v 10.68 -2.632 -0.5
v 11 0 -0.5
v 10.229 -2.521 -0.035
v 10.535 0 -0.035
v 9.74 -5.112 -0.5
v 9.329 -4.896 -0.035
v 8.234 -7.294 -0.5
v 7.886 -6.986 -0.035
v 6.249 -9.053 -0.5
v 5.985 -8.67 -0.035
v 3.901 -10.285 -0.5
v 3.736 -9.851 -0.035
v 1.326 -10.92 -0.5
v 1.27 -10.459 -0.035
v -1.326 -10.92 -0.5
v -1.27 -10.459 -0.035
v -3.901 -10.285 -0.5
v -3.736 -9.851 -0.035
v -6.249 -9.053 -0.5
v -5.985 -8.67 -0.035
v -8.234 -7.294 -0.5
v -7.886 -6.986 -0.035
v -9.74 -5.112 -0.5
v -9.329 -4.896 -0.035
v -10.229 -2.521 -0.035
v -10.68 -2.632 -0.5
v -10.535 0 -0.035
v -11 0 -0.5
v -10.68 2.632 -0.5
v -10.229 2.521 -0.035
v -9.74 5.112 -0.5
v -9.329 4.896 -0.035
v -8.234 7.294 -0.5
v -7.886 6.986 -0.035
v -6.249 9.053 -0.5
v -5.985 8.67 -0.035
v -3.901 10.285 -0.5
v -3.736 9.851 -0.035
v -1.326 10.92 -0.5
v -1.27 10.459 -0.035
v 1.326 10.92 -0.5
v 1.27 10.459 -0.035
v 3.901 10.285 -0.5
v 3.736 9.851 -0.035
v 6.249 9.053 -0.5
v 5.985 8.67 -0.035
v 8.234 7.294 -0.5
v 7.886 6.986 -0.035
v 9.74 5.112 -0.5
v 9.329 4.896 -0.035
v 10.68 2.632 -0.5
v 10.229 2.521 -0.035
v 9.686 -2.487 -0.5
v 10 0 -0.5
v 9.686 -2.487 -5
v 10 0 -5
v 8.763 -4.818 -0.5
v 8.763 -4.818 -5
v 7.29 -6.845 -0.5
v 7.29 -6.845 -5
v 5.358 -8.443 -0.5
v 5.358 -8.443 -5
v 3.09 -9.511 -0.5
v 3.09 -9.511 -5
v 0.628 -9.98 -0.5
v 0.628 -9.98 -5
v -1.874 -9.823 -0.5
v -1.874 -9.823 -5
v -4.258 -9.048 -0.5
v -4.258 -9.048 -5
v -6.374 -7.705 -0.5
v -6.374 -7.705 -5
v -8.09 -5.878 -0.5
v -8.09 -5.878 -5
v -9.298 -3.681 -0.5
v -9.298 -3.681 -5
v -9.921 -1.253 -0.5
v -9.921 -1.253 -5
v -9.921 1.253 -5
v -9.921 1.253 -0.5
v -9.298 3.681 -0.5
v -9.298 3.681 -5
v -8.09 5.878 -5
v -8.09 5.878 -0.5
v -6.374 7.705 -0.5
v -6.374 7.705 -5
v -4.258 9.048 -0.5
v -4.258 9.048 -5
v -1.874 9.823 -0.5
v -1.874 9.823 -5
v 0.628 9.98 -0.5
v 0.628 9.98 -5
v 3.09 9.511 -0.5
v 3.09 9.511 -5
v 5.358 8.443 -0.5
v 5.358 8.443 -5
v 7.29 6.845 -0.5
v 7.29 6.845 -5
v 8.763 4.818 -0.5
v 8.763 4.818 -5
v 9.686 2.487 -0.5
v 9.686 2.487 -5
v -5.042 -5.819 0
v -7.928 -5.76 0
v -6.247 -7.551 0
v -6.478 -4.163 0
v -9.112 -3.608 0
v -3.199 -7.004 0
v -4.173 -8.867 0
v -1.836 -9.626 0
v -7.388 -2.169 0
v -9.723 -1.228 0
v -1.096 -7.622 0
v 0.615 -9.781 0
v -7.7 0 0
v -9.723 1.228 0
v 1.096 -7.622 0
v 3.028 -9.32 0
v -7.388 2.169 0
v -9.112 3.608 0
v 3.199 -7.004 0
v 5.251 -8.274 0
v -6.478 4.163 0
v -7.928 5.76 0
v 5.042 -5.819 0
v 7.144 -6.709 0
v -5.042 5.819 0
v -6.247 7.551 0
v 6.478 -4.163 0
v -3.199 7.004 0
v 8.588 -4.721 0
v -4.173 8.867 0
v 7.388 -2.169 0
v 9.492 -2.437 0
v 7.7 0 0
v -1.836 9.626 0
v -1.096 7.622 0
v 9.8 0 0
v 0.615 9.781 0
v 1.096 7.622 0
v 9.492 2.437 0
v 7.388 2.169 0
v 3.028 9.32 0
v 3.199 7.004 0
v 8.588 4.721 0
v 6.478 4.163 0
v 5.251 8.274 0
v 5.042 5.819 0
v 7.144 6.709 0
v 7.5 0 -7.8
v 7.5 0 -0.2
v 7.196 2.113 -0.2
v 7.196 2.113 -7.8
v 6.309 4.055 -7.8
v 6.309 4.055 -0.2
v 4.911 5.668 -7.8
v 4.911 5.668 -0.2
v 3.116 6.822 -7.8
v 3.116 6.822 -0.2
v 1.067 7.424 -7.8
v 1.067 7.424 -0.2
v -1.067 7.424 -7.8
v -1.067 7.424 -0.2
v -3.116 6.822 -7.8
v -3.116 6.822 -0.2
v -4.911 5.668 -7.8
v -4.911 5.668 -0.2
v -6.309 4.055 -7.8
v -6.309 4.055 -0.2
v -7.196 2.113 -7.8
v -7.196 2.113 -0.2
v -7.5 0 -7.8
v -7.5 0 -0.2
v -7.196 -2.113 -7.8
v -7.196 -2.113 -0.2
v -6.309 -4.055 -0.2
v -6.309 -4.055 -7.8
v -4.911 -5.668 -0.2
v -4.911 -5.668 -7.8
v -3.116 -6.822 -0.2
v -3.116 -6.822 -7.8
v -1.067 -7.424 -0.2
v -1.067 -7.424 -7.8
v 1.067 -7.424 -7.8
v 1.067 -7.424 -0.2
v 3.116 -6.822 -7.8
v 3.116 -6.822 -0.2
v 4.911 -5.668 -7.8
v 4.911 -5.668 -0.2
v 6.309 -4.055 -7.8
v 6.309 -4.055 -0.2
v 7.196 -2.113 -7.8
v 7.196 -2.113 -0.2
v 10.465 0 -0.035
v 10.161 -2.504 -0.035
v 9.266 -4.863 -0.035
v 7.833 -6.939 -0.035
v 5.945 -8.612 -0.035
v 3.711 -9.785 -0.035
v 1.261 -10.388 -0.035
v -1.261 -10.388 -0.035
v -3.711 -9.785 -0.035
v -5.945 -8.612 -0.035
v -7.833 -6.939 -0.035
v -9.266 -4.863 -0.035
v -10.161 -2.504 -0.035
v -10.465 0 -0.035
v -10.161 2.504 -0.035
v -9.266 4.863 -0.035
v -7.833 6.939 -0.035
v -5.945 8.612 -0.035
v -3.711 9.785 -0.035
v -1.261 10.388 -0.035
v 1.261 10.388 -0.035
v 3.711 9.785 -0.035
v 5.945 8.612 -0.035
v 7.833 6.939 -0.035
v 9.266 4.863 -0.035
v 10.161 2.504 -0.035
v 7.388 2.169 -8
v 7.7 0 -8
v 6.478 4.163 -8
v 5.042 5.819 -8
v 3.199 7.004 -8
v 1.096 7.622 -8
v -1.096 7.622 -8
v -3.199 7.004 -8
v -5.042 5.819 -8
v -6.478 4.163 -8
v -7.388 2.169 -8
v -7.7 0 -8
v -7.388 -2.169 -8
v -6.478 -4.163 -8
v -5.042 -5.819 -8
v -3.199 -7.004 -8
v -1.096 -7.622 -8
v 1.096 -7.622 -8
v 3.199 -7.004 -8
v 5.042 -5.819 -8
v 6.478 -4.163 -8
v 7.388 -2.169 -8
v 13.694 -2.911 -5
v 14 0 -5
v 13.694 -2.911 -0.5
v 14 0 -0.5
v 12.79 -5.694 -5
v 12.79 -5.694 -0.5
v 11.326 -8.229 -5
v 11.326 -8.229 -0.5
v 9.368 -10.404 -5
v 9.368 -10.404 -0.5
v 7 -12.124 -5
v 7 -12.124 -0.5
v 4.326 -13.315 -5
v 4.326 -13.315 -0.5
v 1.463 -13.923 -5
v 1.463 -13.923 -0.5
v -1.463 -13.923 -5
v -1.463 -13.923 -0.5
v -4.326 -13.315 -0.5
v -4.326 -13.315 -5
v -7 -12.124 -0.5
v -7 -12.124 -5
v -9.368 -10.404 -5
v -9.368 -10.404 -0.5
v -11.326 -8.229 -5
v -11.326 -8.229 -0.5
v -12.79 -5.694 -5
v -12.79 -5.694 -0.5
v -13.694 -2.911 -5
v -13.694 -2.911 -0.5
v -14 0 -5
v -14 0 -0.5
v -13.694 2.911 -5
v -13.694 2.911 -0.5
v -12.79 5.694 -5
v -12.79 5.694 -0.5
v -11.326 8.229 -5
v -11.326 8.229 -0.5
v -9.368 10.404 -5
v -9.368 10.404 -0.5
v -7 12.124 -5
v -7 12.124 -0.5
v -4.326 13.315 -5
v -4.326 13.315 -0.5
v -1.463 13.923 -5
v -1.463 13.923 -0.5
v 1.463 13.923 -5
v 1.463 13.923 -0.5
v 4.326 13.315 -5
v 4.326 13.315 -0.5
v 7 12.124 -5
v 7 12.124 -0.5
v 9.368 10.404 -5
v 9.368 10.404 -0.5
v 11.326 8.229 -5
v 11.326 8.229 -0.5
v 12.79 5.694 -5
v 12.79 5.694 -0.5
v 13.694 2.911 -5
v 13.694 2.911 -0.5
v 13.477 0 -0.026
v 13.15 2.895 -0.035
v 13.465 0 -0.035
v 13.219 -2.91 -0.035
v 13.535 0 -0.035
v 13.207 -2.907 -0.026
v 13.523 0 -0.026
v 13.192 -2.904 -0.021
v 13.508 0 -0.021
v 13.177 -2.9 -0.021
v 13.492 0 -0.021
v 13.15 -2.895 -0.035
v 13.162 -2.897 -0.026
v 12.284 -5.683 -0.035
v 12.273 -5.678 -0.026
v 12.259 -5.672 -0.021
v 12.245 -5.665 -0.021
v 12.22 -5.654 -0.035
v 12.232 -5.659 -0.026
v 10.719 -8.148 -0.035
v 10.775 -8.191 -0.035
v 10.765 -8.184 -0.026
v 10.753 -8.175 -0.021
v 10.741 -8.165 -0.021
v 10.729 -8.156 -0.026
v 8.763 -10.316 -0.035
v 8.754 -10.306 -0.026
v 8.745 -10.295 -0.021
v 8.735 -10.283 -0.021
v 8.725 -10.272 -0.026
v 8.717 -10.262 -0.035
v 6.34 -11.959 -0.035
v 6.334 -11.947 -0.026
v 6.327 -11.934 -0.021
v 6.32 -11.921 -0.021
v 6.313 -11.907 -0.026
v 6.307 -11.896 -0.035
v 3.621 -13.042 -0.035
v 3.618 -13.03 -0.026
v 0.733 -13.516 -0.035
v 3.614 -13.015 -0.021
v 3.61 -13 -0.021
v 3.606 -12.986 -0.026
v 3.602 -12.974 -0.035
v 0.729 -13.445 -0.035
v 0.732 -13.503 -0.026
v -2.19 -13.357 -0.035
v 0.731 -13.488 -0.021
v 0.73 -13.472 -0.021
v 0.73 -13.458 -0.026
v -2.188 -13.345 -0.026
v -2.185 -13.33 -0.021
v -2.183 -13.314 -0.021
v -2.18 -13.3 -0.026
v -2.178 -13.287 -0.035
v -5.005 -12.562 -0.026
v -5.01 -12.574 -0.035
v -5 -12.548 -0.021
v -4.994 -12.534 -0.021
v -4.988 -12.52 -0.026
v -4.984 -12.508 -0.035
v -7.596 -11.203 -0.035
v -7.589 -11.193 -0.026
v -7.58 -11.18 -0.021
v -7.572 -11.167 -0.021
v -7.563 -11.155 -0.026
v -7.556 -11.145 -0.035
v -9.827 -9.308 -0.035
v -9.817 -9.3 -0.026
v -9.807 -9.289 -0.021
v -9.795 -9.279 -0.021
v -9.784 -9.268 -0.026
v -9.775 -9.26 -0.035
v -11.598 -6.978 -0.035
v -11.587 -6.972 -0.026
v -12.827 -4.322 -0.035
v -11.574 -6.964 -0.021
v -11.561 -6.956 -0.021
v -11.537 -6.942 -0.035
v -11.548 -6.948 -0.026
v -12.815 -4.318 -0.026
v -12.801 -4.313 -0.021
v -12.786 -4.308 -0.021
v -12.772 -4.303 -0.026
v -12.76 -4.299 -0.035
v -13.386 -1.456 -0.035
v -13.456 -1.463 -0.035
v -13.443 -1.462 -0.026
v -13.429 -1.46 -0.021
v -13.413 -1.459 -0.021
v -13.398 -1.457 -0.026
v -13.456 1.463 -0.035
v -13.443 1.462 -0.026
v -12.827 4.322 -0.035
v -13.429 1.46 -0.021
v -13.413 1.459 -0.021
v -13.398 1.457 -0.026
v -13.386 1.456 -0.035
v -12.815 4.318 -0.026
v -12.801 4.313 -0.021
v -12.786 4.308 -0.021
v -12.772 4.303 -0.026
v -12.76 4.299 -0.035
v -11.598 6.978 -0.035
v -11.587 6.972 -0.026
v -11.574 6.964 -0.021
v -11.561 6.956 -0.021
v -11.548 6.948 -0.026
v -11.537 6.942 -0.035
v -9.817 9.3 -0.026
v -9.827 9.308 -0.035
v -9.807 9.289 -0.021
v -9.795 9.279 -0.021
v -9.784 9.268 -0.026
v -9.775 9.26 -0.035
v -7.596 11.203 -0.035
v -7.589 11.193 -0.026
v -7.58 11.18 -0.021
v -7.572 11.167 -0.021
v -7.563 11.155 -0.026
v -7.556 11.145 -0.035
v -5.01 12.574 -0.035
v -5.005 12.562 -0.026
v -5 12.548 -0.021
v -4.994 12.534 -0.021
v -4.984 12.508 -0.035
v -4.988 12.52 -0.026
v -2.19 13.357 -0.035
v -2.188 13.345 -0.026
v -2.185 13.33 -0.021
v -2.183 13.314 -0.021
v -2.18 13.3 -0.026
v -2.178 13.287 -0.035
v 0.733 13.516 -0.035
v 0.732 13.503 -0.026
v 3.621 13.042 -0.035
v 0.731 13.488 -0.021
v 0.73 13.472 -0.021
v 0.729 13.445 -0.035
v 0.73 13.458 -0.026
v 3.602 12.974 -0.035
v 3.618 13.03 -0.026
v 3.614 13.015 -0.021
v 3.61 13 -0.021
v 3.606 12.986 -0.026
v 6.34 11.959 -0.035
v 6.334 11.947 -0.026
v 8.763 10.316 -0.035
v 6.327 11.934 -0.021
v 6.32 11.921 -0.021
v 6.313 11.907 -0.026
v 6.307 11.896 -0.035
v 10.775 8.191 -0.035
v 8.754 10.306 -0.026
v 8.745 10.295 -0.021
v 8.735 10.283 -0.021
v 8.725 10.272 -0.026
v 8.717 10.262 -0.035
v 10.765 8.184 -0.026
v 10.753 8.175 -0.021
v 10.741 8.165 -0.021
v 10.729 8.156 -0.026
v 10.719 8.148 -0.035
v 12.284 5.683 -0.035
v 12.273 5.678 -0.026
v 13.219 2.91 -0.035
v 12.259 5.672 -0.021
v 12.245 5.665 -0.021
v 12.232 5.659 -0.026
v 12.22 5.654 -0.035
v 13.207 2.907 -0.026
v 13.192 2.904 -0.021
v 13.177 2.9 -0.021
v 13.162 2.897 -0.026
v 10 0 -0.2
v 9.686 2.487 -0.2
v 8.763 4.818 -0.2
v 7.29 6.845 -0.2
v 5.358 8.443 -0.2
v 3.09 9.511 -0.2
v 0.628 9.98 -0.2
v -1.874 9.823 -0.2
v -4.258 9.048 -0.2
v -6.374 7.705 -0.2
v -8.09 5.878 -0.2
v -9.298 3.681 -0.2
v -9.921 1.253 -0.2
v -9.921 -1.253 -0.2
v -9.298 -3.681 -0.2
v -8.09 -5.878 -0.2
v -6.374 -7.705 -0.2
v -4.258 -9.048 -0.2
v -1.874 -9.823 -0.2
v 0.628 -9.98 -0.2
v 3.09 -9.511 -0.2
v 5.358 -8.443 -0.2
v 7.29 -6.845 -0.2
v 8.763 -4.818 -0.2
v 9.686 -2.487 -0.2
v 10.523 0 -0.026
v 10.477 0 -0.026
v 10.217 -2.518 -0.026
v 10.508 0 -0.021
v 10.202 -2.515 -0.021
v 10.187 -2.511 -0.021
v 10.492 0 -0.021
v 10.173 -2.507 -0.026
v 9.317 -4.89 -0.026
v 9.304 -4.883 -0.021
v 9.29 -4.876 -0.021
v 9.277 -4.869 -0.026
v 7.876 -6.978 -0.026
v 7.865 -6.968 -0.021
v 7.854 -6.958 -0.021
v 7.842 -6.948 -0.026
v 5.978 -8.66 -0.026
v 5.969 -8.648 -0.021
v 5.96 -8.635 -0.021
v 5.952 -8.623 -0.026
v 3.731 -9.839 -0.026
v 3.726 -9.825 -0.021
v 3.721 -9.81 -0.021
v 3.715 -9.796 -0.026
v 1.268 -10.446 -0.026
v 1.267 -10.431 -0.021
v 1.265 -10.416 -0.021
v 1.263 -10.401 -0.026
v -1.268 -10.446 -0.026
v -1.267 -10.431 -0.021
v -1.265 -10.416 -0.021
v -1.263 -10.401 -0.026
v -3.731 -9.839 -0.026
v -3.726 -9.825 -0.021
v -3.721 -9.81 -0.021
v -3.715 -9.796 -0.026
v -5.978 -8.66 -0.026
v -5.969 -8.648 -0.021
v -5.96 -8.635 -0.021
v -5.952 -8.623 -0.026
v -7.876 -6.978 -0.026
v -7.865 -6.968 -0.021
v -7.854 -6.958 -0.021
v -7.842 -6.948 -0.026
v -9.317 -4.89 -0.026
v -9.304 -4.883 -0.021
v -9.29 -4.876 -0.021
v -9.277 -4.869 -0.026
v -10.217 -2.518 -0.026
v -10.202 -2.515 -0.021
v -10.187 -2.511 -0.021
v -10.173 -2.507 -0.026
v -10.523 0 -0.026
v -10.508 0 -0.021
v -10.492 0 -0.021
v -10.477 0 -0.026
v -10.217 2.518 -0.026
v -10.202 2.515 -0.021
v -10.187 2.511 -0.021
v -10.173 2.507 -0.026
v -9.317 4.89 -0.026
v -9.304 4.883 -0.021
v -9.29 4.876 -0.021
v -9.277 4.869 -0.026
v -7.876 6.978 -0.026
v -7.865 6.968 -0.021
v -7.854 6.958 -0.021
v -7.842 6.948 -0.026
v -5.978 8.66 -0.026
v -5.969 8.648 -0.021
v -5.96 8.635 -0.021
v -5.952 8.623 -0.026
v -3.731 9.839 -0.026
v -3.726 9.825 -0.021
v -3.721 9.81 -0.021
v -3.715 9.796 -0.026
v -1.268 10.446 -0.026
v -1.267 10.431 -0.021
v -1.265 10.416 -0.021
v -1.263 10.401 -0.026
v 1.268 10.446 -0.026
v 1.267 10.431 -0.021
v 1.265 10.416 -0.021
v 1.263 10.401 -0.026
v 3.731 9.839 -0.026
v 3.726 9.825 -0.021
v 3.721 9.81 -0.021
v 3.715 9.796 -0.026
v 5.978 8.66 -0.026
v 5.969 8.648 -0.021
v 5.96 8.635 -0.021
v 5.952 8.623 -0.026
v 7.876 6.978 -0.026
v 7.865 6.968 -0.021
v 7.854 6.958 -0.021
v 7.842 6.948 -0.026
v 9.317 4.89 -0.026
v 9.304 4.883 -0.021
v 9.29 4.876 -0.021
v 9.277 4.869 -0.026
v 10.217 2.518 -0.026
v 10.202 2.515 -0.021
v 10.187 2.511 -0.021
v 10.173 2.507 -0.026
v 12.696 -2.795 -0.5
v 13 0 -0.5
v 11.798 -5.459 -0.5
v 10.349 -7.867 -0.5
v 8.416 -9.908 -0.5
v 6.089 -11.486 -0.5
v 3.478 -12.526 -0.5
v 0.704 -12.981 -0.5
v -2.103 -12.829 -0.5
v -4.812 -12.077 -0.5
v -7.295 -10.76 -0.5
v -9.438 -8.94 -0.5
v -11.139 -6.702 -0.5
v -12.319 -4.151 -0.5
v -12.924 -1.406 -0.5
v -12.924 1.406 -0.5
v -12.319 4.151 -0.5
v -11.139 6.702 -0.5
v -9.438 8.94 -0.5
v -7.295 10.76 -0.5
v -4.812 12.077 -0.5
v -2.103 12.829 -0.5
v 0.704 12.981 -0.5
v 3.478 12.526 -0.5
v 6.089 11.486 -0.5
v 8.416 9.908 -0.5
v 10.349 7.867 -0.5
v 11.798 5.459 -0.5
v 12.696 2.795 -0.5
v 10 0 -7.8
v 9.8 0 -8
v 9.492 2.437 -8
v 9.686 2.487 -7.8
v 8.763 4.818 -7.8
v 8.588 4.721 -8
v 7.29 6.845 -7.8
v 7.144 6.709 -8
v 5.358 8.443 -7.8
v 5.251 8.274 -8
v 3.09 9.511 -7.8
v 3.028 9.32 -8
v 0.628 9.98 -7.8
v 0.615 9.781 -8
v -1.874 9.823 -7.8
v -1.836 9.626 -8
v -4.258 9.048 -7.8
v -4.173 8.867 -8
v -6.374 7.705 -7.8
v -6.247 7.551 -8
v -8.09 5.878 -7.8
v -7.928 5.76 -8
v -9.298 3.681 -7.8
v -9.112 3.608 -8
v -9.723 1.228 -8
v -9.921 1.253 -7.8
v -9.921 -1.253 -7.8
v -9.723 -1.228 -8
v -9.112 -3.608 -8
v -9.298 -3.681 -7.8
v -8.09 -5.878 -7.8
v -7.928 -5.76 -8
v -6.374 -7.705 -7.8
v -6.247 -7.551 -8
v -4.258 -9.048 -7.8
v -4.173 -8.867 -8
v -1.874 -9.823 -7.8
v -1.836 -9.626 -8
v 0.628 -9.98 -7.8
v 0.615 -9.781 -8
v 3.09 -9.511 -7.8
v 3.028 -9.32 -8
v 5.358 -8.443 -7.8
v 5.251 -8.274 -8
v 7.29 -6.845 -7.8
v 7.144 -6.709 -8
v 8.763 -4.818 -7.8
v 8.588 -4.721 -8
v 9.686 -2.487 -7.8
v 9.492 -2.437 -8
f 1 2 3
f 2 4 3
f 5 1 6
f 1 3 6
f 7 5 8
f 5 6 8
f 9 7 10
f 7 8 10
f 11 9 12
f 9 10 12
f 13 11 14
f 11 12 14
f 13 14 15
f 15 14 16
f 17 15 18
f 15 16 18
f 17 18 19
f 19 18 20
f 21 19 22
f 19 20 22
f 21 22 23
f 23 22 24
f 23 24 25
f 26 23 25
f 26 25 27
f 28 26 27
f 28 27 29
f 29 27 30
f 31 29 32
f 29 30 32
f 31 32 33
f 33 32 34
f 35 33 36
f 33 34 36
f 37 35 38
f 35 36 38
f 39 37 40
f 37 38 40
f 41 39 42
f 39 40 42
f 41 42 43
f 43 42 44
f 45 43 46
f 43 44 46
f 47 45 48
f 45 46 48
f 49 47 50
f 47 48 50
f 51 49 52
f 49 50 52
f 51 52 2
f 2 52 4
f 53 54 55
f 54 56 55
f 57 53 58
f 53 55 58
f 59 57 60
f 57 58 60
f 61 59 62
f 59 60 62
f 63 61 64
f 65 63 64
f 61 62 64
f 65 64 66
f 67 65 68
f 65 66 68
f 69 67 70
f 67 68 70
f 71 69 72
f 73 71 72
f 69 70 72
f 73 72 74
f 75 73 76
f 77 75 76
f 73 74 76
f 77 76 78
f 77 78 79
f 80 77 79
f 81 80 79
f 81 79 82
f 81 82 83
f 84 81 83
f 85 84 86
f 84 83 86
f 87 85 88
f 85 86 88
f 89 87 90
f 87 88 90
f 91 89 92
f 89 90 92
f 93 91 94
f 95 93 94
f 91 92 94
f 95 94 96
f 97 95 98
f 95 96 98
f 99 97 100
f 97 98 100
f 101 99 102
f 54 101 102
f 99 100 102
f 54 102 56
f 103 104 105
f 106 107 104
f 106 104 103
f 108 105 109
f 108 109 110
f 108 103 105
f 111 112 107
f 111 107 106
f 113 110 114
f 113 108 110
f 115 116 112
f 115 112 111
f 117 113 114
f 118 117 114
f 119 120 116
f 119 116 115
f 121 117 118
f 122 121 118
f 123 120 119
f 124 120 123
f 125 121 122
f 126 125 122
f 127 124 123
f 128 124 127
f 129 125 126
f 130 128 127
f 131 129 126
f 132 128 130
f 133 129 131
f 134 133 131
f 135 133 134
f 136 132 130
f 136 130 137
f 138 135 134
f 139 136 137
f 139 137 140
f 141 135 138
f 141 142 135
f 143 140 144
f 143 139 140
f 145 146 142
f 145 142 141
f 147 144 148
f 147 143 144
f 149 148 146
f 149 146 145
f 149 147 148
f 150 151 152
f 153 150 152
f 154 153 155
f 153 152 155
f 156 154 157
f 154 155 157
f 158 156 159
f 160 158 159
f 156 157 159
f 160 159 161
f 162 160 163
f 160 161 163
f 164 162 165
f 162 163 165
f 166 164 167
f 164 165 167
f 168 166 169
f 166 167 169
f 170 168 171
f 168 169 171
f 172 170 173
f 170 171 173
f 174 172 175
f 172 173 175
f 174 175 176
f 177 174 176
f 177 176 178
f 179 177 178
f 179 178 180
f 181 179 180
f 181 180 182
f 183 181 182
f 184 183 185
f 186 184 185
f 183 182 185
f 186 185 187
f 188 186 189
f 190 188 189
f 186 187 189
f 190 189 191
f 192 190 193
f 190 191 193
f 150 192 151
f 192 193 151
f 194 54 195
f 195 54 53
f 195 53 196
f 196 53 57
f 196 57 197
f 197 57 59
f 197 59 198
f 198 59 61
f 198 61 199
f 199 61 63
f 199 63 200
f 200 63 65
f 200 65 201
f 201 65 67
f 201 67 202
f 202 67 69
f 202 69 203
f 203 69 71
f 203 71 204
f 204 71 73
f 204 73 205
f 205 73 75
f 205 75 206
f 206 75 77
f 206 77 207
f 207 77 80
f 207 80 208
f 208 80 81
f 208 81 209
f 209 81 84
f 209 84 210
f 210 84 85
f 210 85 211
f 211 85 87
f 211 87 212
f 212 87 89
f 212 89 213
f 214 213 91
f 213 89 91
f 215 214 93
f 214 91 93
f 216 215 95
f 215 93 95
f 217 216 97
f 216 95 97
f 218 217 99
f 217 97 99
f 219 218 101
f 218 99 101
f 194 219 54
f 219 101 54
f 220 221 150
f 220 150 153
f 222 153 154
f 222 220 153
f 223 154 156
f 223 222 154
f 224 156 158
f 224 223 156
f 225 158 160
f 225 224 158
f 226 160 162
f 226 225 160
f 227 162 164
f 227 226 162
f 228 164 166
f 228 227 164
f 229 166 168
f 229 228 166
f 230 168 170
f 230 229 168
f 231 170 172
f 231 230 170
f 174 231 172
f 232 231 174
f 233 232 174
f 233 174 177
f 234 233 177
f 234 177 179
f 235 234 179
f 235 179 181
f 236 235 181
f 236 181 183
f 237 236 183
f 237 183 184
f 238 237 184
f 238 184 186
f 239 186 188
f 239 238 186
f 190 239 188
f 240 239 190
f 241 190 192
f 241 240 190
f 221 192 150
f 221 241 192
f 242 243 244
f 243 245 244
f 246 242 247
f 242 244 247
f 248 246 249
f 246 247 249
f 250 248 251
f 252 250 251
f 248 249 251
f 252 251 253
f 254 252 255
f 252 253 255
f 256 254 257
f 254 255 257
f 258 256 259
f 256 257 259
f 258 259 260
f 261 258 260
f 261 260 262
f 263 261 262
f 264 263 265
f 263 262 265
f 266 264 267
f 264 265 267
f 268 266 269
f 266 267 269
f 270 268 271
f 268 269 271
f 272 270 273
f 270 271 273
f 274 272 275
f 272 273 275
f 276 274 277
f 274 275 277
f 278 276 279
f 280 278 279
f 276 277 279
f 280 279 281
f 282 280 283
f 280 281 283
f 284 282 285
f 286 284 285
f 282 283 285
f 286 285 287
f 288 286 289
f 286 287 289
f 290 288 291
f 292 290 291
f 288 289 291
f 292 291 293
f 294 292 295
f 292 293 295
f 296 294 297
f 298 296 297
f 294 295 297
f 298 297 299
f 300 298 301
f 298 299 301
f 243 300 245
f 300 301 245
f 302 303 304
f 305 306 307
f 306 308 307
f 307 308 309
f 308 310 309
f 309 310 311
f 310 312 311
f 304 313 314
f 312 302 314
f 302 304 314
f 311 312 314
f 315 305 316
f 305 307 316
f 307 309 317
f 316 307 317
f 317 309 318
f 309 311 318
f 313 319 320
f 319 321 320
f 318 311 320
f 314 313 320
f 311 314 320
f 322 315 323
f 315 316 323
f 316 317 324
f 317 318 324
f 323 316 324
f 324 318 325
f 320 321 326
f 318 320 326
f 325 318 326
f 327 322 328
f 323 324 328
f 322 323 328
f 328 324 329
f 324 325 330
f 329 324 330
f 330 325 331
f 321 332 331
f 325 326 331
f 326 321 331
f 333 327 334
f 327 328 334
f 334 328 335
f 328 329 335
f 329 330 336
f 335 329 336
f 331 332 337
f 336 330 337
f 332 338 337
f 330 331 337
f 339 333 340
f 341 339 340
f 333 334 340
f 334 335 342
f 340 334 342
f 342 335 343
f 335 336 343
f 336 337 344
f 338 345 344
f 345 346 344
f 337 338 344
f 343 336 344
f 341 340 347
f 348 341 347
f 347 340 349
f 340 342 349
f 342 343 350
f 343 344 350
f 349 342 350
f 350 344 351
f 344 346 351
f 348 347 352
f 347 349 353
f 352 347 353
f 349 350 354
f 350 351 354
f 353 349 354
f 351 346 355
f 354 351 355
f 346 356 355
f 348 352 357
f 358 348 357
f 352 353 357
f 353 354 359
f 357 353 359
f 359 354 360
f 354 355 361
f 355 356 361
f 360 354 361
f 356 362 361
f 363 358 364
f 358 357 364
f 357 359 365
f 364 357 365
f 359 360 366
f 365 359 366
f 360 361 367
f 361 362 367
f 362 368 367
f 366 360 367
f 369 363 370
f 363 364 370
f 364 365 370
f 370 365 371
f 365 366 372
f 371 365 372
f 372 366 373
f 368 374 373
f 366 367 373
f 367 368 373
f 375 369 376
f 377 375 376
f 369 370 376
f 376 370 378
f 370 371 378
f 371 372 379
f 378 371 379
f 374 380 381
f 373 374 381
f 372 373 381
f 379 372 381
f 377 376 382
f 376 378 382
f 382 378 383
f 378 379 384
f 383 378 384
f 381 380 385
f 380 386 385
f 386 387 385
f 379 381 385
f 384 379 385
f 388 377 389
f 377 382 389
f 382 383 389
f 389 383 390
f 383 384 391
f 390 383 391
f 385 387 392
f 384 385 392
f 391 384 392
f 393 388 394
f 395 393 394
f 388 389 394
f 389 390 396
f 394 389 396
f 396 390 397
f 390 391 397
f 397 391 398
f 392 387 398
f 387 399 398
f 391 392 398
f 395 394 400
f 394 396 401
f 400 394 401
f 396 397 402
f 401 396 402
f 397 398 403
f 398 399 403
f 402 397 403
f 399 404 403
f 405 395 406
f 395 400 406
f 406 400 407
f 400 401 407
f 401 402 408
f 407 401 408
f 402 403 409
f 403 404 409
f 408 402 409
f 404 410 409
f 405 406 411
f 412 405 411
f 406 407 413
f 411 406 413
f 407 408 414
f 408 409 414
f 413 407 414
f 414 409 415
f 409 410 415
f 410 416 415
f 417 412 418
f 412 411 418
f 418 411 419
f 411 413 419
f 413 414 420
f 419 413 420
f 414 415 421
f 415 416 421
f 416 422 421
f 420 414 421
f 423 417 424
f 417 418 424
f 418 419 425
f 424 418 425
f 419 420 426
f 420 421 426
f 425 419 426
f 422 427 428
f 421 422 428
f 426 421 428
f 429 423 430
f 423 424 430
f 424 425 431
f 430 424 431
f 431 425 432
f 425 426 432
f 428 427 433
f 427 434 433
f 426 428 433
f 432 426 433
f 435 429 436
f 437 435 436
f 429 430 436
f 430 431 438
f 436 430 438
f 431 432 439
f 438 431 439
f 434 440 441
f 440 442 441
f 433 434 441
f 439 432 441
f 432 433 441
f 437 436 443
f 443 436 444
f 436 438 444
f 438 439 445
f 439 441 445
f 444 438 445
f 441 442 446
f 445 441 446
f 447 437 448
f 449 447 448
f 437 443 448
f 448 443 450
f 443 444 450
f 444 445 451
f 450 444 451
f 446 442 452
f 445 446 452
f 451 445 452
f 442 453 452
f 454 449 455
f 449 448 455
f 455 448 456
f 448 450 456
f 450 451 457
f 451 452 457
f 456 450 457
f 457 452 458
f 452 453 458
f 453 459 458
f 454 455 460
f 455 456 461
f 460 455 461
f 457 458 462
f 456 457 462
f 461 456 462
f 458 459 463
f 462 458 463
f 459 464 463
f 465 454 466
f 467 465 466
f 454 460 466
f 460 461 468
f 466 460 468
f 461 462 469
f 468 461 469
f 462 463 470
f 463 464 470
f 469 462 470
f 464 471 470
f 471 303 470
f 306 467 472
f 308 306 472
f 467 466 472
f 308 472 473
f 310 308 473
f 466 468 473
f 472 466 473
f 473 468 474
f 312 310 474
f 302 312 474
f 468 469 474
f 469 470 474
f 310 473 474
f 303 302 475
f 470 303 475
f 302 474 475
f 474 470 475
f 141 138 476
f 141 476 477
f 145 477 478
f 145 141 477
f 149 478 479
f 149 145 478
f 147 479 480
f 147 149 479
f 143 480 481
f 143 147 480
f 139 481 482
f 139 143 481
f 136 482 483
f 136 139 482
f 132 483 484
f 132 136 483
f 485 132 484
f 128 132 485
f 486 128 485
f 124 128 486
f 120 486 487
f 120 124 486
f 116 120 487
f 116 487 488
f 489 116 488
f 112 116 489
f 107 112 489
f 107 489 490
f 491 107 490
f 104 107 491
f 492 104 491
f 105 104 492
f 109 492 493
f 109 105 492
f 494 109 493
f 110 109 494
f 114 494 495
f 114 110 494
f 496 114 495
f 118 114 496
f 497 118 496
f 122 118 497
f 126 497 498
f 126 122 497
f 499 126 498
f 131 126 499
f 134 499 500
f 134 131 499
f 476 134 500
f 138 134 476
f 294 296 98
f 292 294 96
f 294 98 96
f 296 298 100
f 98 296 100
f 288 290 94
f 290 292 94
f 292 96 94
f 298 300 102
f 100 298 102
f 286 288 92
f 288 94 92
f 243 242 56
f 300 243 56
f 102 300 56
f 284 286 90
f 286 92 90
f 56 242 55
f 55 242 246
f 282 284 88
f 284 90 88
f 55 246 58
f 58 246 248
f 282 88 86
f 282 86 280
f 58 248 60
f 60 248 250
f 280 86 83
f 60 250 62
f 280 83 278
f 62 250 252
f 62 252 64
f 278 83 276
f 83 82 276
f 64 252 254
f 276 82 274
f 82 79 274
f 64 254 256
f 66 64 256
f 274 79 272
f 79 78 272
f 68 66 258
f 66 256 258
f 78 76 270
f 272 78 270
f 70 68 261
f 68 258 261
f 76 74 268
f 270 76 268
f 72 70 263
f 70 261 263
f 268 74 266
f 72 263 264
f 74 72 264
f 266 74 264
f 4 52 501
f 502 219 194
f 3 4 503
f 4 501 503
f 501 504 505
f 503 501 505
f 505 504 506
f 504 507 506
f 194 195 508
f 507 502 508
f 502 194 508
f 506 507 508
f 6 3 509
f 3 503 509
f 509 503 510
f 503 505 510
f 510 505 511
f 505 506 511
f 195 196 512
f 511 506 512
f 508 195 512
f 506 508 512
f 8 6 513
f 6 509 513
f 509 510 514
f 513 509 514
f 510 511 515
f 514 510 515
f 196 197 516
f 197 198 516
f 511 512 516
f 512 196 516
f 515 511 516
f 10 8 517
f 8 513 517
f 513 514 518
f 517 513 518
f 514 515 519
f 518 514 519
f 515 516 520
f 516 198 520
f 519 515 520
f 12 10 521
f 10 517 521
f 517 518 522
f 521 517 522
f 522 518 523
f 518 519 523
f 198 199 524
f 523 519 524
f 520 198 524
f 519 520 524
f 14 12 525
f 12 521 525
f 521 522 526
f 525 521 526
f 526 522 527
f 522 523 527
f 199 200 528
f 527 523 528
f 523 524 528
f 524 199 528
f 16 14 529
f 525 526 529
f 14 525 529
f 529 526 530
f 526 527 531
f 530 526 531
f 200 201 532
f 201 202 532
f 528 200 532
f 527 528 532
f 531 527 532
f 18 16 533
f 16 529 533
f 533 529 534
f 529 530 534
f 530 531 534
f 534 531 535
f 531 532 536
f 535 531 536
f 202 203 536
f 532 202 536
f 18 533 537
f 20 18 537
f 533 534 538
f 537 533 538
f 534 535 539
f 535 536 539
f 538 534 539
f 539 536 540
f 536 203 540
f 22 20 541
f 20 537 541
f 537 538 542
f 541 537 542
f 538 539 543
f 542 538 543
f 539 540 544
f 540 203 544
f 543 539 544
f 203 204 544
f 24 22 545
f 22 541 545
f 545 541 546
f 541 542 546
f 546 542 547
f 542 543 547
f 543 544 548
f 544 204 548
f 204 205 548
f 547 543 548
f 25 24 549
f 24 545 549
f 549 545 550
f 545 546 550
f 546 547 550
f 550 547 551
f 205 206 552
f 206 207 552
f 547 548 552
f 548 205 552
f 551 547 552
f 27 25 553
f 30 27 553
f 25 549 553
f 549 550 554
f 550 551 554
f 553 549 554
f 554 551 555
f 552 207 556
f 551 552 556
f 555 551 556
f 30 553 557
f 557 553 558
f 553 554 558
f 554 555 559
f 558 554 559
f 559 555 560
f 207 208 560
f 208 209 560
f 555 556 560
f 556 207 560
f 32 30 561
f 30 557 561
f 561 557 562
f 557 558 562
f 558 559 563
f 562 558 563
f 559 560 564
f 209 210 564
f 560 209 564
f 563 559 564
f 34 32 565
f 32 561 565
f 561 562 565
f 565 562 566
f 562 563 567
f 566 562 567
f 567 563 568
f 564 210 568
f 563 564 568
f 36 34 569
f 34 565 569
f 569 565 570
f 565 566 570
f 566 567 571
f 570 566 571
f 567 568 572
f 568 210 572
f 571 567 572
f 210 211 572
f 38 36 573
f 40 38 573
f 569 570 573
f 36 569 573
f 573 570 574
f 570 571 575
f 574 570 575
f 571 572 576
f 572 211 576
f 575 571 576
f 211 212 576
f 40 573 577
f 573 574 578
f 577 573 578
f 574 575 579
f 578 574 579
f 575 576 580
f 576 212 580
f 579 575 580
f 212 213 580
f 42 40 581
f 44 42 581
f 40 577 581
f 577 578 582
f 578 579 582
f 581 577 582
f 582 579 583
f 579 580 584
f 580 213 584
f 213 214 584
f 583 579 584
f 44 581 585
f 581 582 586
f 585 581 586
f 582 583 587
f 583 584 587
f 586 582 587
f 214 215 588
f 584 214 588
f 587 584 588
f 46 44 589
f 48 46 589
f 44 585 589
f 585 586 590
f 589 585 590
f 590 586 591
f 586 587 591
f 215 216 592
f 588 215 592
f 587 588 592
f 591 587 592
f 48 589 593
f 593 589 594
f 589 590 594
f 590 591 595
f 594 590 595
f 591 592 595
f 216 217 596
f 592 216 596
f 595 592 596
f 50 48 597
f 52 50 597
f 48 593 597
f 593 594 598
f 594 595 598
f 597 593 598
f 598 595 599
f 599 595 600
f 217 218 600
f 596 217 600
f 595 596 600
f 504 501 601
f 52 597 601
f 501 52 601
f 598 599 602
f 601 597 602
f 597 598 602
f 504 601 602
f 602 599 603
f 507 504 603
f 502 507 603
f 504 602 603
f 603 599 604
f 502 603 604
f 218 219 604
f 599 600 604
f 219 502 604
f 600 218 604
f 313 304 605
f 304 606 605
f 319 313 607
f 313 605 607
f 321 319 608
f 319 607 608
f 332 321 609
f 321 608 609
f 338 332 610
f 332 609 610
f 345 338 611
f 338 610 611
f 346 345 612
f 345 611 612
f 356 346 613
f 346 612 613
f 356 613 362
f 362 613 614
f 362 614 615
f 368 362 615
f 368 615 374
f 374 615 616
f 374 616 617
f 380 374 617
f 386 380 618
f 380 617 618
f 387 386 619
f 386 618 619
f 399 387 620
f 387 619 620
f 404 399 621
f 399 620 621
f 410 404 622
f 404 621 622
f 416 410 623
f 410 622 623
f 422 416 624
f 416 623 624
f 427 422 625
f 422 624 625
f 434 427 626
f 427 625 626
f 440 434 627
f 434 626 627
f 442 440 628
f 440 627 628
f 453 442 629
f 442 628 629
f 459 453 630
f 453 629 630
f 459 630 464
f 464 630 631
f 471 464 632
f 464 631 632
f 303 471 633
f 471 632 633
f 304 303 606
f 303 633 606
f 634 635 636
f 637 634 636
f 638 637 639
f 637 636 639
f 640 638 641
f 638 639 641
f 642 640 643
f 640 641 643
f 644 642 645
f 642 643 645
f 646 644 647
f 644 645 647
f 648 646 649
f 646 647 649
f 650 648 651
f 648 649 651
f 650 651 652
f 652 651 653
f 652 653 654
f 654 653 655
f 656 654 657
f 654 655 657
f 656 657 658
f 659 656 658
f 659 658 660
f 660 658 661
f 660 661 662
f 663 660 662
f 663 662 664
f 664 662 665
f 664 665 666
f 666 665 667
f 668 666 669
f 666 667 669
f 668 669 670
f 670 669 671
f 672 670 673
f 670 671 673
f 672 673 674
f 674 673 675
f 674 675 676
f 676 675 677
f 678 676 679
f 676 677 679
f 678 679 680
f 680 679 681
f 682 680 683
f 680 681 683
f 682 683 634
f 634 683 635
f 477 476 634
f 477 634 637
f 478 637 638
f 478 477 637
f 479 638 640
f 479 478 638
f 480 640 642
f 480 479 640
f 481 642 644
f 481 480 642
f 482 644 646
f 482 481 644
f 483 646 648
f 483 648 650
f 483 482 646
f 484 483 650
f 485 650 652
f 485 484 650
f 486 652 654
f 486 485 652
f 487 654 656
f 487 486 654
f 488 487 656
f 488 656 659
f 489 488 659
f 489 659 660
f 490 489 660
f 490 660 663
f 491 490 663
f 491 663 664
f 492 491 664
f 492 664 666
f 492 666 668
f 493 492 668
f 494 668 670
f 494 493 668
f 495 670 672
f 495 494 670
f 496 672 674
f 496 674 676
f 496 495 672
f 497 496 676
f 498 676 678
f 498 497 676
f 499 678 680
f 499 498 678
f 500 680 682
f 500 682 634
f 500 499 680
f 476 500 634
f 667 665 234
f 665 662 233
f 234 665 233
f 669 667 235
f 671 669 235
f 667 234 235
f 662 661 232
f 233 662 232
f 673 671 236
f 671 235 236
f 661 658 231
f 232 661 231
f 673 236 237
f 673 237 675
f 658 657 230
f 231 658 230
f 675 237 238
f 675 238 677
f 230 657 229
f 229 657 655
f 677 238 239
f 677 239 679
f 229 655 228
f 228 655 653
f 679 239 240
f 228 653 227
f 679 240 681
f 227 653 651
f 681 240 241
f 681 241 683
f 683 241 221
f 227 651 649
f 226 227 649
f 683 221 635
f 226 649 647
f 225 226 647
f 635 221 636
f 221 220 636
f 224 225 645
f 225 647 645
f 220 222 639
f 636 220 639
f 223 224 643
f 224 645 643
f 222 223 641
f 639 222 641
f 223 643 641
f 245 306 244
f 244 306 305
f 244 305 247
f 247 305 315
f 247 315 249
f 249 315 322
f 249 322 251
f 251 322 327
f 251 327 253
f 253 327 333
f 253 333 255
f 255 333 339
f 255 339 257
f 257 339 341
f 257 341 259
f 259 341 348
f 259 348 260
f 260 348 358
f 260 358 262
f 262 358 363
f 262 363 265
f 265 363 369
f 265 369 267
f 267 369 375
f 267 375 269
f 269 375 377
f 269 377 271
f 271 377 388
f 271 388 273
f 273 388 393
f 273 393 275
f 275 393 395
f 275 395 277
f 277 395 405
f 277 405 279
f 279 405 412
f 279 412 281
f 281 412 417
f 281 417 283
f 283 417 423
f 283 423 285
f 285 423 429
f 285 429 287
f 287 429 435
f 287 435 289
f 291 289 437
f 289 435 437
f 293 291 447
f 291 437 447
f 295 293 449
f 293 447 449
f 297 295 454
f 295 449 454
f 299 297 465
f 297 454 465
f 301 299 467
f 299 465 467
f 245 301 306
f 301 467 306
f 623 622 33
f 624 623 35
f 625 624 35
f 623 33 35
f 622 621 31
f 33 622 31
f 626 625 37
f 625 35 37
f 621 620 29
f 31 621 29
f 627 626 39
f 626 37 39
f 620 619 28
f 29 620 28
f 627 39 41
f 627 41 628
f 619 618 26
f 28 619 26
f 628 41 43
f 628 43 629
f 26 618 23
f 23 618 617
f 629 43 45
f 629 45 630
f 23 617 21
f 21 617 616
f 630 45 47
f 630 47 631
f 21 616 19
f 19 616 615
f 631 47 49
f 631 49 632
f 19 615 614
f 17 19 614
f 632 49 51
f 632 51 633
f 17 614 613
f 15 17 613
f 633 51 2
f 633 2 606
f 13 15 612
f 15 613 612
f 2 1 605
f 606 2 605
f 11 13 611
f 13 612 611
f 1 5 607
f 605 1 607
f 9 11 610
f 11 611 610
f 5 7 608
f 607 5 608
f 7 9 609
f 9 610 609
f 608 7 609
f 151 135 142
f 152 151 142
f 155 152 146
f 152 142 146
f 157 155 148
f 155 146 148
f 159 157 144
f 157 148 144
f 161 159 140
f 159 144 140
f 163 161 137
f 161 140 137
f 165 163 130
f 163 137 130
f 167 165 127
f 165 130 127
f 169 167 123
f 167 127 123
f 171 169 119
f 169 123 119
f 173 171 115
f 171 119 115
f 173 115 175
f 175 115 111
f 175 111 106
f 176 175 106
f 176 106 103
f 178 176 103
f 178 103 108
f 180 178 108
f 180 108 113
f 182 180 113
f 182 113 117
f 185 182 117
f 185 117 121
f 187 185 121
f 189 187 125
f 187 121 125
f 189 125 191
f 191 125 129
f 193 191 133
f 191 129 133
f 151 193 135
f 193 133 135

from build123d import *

# Parameters (mm, degrees)
SKETCH_4_R      = 10
SKETCH_4_R_2    = 7.5
EXTRUDE_1_DEPTH = 8
CHAMFER_1_SIZE  = 0.2


with BuildPart() as part:
    # 草圖2 → 旋轉1 (revolve)
    with BuildSketch(Plane(origin=(0, 0, 0), x_dir=(1, 0, 0), z_dir=(0, 1, 0))):
        with BuildLine():
            Line((10, 5), (14, 5))
            Line((14, 5), (14, 0.5))
            Line((14, 0.5), (13.535355339, 0.035355339))
            ThreePointArc((13.535355339, 0.035355339), (13.5, 0.020710678), (13.464644661, 0.035355339))
            Line((13.464644661, 0.035355339), (13, 0.5))
            Line((13, 0.5), (11, 0.5))
            Line((11, 0.5), (10.535355339, 0.035355339))
            ThreePointArc((10.535355339, 0.035355339), (10.5, 0.020710678), (10.464644661, 0.035355339))
            Line((10.464644661, 0.035355339), (10, 0.5))
            Line((10, 0.5), (10, 5))
        make_face()
    revolve(axis=Axis((0, 0, 0), (0, 0, -1)))


with BuildPart() as body_2:
    # 草圖4 → 填料-伸長1 (new body)
    with BuildSketch(Plane.XY):
        Circle(SKETCH_4_R)
        Circle(SKETCH_4_R_2, mode=Mode.SUBTRACT)
    extrude(amount=-EXTRUDE_1_DEPTH)

    # 導角1
    chamfer_1_edges = [body_2.edges().sort_by_distance(p)[0] for p in [
        (-10, 0, 0),
        (-10, 0, -8),
        (-7.5, 0, -8),
        (-7.5, 0, 0),
    ]]
    chamfer(chamfer_1_edges, length=CHAMFER_1_SIZE)


solid = Compound([part.part, body_2.part])
